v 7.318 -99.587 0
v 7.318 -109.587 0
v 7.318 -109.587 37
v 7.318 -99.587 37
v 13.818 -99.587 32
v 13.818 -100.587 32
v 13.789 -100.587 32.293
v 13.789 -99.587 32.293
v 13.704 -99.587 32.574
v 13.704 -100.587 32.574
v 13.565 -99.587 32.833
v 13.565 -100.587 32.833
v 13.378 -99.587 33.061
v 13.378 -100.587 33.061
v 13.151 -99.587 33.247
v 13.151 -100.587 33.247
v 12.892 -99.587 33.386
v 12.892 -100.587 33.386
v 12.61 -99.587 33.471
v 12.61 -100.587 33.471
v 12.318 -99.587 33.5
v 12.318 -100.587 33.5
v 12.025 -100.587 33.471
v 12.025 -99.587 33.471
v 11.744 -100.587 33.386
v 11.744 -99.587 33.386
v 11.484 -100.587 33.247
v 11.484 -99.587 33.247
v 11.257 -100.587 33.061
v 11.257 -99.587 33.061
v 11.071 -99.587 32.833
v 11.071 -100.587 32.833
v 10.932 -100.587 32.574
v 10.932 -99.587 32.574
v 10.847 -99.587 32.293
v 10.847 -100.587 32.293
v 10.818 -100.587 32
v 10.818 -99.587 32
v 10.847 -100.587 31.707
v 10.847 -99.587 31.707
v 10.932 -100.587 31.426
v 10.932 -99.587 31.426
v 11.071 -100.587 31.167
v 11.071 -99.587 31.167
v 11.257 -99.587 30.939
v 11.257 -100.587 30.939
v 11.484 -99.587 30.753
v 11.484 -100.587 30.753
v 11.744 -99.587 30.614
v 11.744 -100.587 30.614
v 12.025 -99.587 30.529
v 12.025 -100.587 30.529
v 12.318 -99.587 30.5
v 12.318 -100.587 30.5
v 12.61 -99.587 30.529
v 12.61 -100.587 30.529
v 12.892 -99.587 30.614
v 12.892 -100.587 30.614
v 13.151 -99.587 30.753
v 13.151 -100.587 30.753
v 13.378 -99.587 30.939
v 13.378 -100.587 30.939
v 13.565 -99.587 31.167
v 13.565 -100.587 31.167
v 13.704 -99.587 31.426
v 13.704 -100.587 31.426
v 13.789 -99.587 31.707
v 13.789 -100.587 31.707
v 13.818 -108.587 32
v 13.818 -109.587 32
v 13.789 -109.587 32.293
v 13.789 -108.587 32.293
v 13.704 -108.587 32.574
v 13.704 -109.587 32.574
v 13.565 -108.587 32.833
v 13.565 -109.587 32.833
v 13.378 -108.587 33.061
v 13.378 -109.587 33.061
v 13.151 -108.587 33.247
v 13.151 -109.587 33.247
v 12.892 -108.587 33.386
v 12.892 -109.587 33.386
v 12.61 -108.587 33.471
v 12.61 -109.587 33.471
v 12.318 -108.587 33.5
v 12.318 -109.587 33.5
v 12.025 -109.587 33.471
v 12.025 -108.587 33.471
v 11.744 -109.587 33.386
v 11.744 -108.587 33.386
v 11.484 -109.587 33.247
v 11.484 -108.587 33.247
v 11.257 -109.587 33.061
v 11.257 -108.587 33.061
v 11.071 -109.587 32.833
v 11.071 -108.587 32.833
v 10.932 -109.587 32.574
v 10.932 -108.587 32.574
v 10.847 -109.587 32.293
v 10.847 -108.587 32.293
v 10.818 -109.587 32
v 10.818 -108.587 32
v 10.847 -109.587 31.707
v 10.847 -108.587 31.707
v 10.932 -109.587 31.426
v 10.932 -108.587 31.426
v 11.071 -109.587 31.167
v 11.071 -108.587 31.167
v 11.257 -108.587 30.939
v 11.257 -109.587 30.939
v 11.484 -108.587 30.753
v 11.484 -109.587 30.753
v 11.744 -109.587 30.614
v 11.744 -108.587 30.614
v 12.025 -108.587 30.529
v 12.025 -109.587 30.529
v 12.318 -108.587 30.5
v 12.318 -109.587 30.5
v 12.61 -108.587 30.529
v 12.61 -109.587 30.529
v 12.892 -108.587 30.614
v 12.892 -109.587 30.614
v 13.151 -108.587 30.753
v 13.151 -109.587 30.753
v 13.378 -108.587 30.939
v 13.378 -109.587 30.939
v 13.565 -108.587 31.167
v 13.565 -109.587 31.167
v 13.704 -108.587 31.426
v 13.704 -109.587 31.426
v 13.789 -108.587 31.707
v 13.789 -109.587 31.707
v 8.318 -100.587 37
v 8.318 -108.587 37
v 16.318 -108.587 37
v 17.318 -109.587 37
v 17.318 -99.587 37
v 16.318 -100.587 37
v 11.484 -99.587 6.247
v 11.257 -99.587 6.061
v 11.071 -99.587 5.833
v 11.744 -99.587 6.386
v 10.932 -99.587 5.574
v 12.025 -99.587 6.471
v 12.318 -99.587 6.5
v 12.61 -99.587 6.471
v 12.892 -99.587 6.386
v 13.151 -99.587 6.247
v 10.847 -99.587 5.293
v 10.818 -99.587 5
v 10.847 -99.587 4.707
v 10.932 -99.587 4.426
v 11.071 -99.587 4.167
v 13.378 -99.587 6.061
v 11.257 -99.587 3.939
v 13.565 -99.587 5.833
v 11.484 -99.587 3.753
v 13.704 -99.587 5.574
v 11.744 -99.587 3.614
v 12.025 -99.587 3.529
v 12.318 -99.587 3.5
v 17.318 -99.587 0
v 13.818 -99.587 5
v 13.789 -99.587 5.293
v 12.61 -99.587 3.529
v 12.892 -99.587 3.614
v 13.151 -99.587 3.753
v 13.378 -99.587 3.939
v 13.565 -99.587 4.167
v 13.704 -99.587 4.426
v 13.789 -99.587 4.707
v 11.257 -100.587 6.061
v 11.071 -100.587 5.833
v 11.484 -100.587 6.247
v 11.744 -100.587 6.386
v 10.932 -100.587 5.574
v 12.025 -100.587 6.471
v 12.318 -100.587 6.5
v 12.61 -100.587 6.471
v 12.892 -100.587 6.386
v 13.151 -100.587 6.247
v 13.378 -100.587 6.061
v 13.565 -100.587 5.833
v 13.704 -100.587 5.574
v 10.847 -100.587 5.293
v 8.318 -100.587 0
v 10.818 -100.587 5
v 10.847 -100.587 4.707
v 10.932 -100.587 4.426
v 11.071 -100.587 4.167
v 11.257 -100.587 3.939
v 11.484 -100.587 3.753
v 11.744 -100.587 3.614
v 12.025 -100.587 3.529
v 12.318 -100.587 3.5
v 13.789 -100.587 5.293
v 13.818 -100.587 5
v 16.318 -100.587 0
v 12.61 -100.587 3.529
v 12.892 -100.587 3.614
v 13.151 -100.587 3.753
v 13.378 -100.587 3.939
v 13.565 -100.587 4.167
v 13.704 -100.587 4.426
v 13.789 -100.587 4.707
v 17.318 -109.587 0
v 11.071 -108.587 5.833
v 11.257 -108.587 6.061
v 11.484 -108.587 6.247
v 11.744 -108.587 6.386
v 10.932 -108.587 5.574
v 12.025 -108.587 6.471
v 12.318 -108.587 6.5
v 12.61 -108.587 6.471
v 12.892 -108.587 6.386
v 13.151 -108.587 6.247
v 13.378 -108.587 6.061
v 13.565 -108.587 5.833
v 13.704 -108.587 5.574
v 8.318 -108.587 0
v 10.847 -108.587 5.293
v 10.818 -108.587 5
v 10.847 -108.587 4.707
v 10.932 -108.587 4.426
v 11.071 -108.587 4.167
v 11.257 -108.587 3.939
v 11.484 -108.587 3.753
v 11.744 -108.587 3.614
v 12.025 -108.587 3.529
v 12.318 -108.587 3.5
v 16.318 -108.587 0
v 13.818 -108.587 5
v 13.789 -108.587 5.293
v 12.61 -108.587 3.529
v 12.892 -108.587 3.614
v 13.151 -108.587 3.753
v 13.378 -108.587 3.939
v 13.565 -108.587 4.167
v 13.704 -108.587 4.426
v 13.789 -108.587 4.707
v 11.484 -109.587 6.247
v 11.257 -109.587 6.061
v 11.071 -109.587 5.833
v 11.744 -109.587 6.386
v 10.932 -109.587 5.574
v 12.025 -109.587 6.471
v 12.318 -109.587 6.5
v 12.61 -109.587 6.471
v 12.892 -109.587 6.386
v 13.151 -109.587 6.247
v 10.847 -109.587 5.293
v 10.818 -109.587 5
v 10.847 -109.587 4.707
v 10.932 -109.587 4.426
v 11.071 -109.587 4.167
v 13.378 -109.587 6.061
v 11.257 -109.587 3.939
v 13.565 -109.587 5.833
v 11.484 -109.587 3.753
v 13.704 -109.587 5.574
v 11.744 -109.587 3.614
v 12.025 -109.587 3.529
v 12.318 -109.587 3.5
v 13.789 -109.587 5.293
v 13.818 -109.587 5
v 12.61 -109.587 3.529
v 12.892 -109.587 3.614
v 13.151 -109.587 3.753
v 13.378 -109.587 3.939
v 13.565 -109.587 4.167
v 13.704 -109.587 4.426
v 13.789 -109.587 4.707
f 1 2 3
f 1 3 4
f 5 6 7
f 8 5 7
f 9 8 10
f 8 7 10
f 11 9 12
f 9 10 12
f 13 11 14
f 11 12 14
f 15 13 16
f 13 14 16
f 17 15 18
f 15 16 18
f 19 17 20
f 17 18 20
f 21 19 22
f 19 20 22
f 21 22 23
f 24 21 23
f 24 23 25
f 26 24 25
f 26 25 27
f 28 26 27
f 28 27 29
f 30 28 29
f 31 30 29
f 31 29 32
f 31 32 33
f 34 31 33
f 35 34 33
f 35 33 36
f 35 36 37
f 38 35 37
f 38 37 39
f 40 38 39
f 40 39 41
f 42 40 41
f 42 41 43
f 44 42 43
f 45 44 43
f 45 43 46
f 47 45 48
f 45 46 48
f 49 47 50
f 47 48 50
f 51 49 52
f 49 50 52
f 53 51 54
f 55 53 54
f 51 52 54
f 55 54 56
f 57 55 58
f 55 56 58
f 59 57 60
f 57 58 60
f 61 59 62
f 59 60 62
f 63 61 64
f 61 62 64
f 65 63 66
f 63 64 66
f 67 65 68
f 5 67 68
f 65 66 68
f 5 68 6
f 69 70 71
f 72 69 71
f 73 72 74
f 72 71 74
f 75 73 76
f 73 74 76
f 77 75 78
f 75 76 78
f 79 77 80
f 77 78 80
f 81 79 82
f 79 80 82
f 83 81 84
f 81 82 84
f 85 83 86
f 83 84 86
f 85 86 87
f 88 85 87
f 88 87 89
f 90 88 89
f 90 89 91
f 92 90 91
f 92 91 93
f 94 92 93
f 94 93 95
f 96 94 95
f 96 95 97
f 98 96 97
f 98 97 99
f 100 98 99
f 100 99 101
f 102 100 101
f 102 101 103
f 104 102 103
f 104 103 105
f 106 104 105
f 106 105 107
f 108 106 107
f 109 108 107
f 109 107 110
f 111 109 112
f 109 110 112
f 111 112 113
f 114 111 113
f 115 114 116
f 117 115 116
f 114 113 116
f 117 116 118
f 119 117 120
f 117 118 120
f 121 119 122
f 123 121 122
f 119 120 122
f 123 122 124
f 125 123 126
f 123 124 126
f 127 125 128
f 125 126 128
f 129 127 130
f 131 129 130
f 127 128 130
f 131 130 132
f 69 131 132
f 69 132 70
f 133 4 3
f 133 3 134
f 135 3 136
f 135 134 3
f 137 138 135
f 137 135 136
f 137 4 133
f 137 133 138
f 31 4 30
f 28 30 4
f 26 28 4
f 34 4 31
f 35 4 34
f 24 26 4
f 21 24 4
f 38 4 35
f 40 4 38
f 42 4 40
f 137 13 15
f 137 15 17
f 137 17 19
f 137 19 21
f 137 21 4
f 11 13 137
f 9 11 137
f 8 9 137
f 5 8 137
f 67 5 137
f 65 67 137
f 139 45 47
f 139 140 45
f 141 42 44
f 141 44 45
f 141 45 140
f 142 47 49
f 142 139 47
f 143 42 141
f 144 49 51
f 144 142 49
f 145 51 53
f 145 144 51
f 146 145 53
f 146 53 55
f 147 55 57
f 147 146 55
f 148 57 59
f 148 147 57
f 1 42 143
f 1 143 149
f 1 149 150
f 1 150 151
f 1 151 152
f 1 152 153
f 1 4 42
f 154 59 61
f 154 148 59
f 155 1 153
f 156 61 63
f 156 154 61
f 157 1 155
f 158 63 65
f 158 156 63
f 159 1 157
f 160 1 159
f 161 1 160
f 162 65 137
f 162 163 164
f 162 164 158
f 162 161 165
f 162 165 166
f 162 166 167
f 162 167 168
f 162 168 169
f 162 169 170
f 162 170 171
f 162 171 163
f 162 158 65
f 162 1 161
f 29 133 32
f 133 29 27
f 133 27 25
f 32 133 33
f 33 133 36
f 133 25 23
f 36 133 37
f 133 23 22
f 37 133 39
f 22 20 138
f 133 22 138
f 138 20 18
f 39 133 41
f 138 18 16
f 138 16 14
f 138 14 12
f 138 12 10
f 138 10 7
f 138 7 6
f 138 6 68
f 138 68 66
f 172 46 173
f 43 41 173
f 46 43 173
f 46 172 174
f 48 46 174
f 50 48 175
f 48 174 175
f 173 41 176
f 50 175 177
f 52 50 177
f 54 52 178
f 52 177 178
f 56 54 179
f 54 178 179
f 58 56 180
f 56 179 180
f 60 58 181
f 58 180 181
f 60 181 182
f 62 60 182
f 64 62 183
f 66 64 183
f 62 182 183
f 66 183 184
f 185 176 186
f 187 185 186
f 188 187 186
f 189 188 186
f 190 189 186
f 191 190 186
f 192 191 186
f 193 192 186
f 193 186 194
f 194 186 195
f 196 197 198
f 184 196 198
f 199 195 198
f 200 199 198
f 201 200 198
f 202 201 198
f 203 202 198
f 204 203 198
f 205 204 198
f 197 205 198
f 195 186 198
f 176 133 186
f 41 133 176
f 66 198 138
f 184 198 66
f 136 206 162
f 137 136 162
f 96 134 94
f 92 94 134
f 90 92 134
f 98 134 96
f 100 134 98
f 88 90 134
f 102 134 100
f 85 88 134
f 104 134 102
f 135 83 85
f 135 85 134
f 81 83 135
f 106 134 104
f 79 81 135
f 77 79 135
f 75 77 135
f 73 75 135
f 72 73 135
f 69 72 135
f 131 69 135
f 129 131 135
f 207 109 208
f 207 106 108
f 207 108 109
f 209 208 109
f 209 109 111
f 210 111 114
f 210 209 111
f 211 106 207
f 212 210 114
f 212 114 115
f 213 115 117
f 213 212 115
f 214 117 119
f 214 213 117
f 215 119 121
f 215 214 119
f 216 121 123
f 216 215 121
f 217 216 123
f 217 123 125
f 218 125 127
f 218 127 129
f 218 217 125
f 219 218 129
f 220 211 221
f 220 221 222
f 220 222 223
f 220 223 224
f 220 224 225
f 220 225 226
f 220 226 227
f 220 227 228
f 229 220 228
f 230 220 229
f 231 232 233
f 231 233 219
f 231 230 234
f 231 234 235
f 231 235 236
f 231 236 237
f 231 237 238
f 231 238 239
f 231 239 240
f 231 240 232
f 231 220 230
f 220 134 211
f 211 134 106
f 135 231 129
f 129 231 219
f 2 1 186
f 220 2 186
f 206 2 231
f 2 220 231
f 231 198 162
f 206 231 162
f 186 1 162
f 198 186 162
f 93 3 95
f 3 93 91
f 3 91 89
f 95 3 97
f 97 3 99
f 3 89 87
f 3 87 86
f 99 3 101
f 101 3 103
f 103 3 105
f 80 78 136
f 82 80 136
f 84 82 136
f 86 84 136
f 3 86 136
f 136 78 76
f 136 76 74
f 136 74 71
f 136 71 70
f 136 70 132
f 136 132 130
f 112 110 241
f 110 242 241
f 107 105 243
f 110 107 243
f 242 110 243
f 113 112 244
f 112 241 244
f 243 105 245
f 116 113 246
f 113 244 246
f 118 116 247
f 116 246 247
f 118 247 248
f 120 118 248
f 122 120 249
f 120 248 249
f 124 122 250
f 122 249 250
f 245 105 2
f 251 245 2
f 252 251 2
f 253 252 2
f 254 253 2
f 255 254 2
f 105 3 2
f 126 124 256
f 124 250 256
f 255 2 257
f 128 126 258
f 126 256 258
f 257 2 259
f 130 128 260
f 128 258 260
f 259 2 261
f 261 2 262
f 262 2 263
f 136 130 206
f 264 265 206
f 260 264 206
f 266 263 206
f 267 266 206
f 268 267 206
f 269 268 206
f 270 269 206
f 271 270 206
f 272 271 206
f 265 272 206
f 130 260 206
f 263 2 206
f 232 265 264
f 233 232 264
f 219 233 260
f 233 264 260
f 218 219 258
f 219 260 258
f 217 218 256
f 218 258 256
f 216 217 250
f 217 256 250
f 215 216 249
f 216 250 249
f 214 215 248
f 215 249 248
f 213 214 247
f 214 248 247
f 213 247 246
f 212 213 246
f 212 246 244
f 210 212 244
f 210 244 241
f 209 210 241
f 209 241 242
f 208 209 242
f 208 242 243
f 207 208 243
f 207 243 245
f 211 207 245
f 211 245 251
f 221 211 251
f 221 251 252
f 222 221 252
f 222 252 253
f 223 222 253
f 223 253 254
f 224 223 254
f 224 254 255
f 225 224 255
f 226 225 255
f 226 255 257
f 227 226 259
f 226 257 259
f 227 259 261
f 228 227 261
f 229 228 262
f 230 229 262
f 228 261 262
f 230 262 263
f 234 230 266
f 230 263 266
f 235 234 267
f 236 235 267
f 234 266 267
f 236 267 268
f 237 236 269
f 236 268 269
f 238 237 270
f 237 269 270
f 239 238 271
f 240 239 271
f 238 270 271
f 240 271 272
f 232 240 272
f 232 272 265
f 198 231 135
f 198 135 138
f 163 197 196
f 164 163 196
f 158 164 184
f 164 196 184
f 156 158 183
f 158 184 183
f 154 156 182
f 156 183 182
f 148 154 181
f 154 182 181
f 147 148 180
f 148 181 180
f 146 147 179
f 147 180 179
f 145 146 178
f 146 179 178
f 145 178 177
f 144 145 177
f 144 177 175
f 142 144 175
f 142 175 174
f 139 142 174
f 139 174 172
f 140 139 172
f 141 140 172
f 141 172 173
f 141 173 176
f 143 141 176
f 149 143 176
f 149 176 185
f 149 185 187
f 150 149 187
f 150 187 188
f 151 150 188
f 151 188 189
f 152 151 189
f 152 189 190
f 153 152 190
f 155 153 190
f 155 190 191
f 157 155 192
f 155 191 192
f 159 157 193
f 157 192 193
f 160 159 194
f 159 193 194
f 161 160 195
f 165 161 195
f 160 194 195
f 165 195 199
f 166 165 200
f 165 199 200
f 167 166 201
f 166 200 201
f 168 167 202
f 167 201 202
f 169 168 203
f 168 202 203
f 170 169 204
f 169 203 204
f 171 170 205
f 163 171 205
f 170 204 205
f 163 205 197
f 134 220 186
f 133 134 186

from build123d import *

# Parameters (mm, degrees)
SKETCH_1_W          = 10
SKETCH_1_H          = 10
SKETCH_1_W_2        = 8
SKETCH_1_H_2        = 8
EXTRUDE_1_DEPTH     = 37
SKETCH_2_R          = 1.5
CUT_EXTRUDE_1_DEPTH = 10


with BuildPart() as part:
    # 草图1 → 拉伸-薄壁1 (new body)
    with BuildSketch(Plane.XY):
        with Locations((12.317764791, -104.586504738)):
            Rectangle(SKETCH_1_W, SKETCH_1_H)
        with Locations((12.317764791, -104.586504738)):
            Rectangle(SKETCH_1_W_2, SKETCH_1_H_2, mode=Mode.SUBTRACT)
    extrude(amount=EXTRUDE_1_DEPTH)

    # 草图2 → 切除-拉伸1 (cut)
    with BuildSketch(Plane.XZ.offset(109.586504738)):
        with Locations((12.317764791, 5)):
            Circle(SKETCH_2_R)
        with Locations((12.317764791, 32)):
            Circle(SKETCH_2_R)
    extrude(amount=-CUT_EXTRUDE_1_DEPTH, mode=Mode.SUBTRACT)


solid = part.part
